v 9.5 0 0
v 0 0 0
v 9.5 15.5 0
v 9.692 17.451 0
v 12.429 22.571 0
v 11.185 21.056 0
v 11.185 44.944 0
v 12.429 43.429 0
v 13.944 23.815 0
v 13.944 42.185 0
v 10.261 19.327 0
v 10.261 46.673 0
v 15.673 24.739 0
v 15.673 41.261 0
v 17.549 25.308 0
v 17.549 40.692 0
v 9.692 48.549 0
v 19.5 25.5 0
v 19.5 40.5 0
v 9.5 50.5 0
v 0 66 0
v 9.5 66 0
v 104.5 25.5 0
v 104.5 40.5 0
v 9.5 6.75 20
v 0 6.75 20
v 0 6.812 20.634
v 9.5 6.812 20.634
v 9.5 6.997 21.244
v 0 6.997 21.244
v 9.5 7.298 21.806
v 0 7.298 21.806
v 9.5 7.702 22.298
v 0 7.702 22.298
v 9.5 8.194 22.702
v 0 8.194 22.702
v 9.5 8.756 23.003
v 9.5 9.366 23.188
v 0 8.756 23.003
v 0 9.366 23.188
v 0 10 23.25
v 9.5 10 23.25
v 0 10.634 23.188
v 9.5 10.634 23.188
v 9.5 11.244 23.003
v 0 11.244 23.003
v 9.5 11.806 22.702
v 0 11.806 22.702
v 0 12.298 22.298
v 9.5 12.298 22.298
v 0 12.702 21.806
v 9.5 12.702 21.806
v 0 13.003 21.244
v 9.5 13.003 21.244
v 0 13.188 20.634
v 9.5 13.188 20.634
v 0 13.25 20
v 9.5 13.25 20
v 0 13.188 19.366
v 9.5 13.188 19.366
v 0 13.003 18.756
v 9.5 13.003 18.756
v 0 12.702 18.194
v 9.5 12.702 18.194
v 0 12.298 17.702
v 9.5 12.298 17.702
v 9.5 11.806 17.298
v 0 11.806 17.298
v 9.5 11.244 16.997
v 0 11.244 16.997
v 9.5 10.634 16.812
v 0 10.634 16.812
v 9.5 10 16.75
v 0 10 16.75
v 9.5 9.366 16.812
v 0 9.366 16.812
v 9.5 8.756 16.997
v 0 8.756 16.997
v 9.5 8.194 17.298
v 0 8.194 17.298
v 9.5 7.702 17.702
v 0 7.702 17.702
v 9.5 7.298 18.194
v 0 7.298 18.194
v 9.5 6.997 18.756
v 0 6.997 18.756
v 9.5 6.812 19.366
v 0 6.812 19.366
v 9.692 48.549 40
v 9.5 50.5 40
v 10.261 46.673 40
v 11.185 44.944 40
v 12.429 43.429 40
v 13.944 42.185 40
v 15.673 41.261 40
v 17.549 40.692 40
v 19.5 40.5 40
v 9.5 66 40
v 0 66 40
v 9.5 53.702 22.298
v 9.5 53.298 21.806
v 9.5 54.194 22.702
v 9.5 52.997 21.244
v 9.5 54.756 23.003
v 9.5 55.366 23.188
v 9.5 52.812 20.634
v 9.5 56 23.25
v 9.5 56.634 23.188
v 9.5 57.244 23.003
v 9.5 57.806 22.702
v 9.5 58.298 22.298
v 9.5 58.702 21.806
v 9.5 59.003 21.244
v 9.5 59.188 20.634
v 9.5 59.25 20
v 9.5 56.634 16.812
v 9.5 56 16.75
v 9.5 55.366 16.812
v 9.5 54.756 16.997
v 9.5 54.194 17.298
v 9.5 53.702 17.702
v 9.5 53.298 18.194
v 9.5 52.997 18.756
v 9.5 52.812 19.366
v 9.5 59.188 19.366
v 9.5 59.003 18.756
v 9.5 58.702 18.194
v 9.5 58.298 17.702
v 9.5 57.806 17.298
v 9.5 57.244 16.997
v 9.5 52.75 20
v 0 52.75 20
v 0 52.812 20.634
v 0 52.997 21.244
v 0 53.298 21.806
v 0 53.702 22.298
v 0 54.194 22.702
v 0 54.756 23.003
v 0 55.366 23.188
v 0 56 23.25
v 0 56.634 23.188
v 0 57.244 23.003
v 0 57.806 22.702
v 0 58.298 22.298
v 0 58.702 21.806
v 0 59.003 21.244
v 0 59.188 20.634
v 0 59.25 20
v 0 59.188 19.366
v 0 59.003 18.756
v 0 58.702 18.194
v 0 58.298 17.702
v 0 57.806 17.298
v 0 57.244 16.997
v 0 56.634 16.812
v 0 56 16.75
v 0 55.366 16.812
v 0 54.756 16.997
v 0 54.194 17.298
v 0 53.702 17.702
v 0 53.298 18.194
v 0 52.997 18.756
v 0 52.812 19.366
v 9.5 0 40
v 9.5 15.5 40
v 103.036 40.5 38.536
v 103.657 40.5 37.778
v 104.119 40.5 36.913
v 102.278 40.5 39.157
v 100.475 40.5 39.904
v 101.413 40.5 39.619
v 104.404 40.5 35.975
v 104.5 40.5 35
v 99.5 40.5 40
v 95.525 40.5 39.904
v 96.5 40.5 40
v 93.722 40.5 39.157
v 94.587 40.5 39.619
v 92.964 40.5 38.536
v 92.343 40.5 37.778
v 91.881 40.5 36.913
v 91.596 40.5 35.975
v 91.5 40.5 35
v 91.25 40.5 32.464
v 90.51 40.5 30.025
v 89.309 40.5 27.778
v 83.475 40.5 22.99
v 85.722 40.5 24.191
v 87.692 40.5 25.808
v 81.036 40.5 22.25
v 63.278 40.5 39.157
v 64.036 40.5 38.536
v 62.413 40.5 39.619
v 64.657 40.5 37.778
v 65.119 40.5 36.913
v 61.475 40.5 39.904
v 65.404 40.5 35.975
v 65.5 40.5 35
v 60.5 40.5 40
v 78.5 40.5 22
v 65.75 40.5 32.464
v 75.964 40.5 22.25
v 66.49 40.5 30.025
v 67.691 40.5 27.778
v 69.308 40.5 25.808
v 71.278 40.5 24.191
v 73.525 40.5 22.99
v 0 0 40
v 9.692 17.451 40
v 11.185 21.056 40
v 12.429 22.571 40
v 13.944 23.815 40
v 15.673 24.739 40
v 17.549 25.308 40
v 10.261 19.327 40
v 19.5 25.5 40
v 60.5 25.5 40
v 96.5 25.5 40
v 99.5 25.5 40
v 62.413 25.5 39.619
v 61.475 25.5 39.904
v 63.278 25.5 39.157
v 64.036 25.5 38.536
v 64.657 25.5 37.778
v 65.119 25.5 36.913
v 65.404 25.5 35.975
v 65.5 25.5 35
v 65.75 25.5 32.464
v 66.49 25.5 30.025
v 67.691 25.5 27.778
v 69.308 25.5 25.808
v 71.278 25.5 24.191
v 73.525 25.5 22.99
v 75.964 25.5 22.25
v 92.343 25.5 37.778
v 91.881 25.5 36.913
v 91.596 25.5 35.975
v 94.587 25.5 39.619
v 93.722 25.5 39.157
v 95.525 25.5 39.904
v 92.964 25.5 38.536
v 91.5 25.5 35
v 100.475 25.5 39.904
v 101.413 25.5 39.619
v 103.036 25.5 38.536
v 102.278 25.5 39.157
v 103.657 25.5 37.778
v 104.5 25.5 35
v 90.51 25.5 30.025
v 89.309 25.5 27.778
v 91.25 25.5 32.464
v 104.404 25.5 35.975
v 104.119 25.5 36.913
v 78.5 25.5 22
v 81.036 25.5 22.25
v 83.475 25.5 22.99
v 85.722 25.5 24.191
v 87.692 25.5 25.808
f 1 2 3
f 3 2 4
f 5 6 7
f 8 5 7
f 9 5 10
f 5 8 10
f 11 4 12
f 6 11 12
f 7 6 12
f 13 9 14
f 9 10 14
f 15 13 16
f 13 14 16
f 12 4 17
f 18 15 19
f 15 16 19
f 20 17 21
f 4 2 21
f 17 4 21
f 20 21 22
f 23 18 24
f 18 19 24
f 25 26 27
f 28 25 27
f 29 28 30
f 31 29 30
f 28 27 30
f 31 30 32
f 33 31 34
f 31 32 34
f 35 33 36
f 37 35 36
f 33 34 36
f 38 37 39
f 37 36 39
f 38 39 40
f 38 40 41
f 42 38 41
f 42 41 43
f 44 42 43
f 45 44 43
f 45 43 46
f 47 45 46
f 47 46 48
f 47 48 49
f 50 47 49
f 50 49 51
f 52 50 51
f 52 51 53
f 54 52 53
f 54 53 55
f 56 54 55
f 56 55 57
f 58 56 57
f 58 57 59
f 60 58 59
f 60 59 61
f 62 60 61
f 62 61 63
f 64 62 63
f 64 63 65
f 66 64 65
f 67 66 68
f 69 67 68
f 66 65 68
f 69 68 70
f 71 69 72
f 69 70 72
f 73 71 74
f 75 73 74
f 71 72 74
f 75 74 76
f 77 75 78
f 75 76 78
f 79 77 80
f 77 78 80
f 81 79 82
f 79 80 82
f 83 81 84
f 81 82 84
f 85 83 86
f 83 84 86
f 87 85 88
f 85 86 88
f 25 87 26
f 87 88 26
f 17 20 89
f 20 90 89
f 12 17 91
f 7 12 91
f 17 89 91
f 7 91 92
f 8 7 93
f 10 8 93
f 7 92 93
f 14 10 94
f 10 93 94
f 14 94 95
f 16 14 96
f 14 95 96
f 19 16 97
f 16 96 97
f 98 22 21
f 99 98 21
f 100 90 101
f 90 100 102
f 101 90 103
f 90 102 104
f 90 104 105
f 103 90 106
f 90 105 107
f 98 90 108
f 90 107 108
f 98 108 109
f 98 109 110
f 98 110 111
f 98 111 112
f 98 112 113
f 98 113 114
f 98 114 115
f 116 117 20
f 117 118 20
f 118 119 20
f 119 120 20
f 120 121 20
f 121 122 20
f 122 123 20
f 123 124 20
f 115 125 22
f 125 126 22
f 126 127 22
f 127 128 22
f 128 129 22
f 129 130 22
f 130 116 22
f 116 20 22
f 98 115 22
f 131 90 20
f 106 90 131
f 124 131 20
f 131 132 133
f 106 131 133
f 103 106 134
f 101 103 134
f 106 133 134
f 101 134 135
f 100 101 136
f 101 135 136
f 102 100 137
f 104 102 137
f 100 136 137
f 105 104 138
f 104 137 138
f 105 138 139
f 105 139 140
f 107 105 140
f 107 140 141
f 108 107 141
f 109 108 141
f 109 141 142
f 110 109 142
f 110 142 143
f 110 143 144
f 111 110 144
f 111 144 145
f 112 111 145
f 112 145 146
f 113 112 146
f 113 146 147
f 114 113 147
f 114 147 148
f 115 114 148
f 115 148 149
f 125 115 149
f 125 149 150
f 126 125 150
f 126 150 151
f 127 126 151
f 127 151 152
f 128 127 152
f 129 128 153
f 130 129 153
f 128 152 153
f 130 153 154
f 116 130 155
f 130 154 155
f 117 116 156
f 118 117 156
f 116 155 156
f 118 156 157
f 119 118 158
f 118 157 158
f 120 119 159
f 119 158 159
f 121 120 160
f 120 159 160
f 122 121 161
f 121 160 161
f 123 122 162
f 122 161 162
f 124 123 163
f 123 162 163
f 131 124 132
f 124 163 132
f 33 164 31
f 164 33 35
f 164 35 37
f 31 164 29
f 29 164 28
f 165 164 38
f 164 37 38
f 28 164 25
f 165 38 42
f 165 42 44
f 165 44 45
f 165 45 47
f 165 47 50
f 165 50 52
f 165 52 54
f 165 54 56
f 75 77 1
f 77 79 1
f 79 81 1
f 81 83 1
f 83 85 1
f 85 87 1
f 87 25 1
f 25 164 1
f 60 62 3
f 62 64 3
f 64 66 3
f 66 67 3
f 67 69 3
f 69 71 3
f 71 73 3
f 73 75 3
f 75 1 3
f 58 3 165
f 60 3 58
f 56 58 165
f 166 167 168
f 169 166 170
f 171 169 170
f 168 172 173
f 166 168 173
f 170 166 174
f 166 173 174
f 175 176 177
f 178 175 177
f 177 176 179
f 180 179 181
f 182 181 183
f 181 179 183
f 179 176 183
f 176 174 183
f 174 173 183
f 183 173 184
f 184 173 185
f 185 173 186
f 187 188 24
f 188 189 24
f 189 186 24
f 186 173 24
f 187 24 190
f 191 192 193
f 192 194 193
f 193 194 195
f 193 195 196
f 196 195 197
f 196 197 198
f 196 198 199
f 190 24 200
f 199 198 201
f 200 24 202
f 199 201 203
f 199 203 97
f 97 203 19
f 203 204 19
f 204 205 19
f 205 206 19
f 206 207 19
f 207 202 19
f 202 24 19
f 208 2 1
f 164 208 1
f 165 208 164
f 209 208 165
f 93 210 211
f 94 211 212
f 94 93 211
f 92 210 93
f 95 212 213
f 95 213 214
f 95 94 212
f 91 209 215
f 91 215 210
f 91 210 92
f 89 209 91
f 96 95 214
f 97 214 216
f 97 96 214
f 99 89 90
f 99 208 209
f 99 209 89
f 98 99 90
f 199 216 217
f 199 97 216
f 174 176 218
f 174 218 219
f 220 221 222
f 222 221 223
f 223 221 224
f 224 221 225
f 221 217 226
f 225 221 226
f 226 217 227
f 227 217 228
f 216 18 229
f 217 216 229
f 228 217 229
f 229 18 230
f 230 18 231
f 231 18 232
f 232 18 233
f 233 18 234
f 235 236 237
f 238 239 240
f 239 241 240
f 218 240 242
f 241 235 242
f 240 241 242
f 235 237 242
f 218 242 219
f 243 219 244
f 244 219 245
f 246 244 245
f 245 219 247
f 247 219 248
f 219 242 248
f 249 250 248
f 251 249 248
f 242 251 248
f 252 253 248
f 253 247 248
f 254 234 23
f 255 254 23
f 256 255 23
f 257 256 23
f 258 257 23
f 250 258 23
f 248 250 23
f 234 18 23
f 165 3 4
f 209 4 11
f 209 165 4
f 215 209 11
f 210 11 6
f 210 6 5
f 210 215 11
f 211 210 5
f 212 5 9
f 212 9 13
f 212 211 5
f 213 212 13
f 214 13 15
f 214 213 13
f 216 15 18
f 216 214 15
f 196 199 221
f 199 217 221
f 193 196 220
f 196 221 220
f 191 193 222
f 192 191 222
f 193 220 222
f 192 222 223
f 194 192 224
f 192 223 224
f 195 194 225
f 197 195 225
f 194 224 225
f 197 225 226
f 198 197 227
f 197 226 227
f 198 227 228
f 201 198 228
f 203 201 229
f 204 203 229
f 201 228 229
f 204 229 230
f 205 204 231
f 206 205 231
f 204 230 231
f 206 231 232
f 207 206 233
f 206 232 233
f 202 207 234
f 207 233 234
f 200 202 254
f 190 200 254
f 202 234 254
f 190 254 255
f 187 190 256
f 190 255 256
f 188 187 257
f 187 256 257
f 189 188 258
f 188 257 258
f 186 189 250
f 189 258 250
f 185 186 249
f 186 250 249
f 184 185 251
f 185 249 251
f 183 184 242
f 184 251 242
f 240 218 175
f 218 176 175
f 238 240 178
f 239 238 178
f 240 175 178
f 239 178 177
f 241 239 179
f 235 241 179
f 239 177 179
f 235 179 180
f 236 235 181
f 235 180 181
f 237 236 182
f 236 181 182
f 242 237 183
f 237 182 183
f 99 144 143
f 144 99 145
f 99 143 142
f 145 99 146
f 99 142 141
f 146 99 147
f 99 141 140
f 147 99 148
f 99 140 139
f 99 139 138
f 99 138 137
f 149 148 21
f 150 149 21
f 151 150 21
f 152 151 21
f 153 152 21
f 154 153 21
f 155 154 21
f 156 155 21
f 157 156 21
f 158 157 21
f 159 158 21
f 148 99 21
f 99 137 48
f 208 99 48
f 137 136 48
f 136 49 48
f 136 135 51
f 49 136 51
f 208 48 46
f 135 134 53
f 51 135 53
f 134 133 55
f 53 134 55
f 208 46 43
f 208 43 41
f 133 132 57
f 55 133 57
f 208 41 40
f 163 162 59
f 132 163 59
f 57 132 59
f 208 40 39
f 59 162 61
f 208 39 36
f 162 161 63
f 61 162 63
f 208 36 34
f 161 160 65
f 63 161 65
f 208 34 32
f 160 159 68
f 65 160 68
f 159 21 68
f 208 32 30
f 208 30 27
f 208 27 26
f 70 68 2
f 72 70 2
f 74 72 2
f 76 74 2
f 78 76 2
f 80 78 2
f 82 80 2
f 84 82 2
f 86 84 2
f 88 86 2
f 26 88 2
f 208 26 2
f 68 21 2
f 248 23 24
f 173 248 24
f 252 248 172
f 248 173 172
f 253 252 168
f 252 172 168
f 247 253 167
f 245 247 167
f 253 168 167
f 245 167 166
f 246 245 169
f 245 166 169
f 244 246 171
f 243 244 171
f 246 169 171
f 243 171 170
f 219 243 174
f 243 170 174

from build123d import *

# Parameters (mm, degrees)
F1_DEPTH = 40
F2_R     = 3.25
F3_DEPTH = 104.501
F5_DEPTH = 40.501
F6_R     = 10
F7_R     = 4.99999
F8_R     = 5


# Not quite as in the source:
# - a fillet or chamfer is up to 0.001 mm smaller than in the source, because OpenCascade refuses the exact size


with BuildPart() as f1:
    # F0 (on Top) → F1 (new body)
    with BuildSketch(Plane.XY):
        Polygon((0, 66), (0, 0), (9.5, 0), (9.5, 25.5), (104.5, 25.5), (104.5, 40.5), (9.5, 40.5), (9.5, 66), align=None)
    extrude(amount=F1_DEPTH)

    # F2 (on face) → F3 (cut, through all)
    with BuildSketch(Plane(origin=(0, 0, 0), x_dir=(0, -1, 0), z_dir=(-1, 0, 0))):
        with Locations((-56, 20)):
            Circle(F2_R)
        with Locations((-10, 20)):
            Circle(F2_R)
    extrude(amount=-F3_DEPTH, mode=Mode.SUBTRACT)

    # F4 (on face) → F5 (cut, through all)
    with BuildSketch(Plane.XZ.offset(-25.5)):
        with BuildLine():
            Line((65.5, 35), (91.5, 35))
            ThreePointArc((91.5, 35), (78.5, 48), (65.5, 35))
        make_face()
        with BuildLine():
            ThreePointArc((65.5, 35), (78.5, 22), (91.5, 35))
            Line((91.5, 35), (65.5, 35))
        make_face()
        with BuildLine():
            ThreePointArc((65.5, 35), (78.5, 48), (91.5, 35))
            Line((91.5, 35), (91.5, 50.4635125536))
            Line((91.5, 50.4635125536), (65.5, 50.4635125536))
            Line((65.5, 50.4635125536), (65.5, 35))
        make_face()
    extrude(amount=-F5_DEPTH, mode=Mode.SUBTRACT)

    # F6
    f6_edges = [f1.edges().sort_by_distance(p)[0] for p in [
        (9.5, 25.5, 20),
        (9.5, 40.5, 20),
    ]]
    fillet(f6_edges, radius=F6_R)

    # F7 (radius 5 in the source; OpenCascade refuses exactly that, so slightly less here)
    f7_edges = [f1.edges().sort_by_distance(p)[0] for p in [
        (65.5, 33, 40),
        (91.5, 33, 40),
    ]]
    fillet(f7_edges, radius=F7_R)

    # F8
    f8_edges = [f1.edges().sort_by_distance(p)[0] for p in [
        (104.5, 33, 40),
    ]]
    fillet(f8_edges, radius=F8_R)


solid = f1.part
